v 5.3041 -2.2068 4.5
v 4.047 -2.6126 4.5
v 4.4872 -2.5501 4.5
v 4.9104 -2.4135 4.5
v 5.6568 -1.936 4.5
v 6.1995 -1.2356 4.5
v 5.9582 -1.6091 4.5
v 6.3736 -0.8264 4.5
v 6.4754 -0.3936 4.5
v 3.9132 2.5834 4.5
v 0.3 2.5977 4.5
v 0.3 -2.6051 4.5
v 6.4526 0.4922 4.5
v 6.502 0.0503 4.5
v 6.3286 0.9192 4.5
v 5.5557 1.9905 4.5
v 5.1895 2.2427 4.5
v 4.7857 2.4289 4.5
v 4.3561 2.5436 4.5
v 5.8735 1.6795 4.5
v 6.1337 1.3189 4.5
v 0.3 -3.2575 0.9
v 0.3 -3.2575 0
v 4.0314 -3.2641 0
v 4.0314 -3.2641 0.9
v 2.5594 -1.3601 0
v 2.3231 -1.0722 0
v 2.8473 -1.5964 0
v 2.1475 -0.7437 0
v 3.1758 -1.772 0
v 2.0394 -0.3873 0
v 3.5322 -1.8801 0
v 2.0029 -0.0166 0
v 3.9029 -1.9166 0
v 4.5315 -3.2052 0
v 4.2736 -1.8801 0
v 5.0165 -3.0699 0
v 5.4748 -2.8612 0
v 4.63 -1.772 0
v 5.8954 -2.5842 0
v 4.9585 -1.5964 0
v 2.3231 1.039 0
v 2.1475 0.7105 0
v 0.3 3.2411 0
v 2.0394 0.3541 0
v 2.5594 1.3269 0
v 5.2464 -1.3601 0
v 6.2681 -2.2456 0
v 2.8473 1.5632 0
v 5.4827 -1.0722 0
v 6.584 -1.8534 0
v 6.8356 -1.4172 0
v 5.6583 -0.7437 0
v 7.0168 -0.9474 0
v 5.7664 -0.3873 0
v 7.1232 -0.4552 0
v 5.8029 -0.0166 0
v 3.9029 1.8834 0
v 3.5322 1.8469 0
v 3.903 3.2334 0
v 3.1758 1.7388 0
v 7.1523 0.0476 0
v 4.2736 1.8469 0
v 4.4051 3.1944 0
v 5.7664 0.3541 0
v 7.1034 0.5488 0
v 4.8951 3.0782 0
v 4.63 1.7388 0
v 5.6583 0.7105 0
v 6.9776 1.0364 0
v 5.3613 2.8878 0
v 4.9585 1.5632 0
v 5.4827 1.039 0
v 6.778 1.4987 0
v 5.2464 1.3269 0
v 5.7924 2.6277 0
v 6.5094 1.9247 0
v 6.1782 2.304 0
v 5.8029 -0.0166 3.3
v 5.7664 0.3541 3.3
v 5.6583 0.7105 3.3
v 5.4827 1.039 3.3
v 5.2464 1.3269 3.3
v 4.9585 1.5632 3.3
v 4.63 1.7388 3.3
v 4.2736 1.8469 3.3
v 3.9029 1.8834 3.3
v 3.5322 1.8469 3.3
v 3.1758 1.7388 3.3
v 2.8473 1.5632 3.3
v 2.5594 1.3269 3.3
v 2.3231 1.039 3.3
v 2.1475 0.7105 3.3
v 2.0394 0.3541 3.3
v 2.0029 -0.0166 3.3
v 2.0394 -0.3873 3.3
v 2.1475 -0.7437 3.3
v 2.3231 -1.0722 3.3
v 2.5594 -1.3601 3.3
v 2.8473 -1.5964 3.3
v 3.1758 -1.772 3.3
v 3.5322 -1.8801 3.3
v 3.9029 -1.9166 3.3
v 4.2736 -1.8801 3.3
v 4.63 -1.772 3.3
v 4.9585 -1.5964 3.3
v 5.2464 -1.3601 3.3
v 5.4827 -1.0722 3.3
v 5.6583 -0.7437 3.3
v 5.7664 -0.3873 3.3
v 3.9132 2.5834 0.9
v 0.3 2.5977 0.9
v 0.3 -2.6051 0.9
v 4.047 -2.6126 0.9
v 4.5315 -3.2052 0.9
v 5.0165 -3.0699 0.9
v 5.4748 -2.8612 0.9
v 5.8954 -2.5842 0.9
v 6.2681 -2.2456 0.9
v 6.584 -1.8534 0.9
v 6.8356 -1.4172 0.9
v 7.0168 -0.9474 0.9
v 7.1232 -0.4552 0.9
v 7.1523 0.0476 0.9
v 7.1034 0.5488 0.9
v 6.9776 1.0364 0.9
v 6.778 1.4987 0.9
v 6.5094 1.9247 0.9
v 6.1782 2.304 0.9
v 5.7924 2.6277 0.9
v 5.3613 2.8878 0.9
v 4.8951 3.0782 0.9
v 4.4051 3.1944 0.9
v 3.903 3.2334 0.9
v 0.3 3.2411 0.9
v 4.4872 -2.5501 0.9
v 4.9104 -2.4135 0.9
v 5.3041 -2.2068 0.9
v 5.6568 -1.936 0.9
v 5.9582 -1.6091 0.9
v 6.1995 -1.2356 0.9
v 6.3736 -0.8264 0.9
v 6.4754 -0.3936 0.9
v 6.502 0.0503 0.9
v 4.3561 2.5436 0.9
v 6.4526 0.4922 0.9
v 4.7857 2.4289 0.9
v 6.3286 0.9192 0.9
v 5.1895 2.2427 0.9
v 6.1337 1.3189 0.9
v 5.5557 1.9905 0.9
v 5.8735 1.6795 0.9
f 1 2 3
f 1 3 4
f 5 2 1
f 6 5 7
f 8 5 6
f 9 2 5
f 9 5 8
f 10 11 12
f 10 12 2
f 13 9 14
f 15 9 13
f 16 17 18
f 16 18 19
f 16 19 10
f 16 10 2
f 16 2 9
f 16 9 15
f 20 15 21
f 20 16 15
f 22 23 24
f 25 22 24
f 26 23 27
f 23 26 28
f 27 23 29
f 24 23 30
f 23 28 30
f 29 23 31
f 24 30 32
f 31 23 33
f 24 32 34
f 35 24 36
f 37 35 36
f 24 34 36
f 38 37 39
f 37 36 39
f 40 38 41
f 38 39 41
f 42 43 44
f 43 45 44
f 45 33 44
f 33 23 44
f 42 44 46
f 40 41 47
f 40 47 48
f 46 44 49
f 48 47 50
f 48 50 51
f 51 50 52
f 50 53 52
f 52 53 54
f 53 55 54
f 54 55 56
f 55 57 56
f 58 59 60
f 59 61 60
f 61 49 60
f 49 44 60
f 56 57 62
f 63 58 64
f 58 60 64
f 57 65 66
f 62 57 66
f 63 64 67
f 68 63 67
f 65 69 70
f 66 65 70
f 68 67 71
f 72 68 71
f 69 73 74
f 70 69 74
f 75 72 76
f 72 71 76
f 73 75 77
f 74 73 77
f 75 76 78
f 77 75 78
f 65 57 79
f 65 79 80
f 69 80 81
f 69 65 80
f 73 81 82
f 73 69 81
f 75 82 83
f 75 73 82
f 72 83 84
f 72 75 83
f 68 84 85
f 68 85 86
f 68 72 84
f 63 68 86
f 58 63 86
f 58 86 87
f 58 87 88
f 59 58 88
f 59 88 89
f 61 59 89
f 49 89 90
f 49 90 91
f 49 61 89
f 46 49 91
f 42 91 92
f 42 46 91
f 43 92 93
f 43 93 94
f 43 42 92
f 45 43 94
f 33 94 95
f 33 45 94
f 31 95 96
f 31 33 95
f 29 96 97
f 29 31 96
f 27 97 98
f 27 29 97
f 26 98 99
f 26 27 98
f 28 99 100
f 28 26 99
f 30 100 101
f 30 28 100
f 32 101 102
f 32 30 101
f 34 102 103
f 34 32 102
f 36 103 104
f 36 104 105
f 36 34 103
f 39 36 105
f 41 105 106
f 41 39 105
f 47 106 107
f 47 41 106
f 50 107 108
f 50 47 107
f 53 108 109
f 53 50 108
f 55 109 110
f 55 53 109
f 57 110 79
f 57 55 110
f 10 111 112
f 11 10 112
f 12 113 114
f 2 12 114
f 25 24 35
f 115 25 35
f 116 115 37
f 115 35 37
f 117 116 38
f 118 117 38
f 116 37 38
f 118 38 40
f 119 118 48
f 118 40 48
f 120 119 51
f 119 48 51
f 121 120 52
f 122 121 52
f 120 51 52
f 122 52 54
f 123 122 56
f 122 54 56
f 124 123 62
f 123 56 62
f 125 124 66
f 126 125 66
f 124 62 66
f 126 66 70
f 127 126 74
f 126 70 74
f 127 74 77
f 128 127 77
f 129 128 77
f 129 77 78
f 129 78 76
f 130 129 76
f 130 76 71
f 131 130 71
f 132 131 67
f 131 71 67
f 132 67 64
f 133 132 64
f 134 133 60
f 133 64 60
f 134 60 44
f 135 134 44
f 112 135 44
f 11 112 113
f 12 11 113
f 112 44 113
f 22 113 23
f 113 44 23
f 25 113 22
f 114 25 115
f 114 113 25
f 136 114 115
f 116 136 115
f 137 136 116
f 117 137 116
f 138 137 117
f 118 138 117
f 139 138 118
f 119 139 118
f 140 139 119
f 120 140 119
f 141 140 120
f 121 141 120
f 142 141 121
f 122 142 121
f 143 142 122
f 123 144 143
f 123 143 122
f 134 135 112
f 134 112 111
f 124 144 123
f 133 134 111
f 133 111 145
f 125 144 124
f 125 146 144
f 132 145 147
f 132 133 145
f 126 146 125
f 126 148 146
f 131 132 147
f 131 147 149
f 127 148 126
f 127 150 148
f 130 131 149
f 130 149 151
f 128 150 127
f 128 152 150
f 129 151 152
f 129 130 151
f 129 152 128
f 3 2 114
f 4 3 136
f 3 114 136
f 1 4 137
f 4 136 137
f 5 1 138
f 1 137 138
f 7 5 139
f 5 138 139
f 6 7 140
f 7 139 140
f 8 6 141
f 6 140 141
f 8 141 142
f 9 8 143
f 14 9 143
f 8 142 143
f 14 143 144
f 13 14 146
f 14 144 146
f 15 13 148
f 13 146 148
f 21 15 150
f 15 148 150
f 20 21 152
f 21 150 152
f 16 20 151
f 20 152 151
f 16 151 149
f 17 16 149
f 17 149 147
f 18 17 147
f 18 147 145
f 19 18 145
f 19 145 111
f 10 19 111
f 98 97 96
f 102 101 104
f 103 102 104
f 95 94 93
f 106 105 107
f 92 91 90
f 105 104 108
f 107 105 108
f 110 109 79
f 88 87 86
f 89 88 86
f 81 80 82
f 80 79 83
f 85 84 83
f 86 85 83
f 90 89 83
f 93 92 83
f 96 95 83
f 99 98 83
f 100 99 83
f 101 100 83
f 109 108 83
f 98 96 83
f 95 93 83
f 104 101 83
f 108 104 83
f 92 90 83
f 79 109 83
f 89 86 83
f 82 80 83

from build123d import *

# Parameters (mm, degrees)
F0_R     = 1.9
F1_DEPTH = 0.9
F2_DEPTH = 4.5
F3_DEPTH = 3.3


with BuildPart() as f1:
    # F0 (on Top) → F1 (new body)
    with BuildSketch(Plane.XY):
        with BuildLine():
            Line((-0.3, 2.6000520814), (-3.8955825641, 2.5999907979))
            ThreePointArc((-3.8955825641, 2.5999907979), (-6.5018304859, -0.0590002136), (-3.7776200645, -2.5969992302))
            Line((-3.7776200645, -2.5969992302), (-0.3, -2.6039384091))
            Line((-0.3, -2.6039384091), (-0.3, 2.6000520814))
        make_face()
        with Locations((-3.9025, 0)):
            Circle(F0_R, mode=Mode.SUBTRACT)
        with BuildLine():
            ThreePointArc((-3.7776200645, -2.5969992302), (-6.5018304859, -0.0590002136), (-3.8955825641, 2.5999907979))
            Line((-3.8955825641, 2.5999907979), (-0.3, 2.6000520814))
            Line((-0.3, 2.6000520814), (-0.3, 3.2423396327))
            Line((-0.3, 3.2423396327), (-3.8955825641, 3.2499926383))
            ThreePointArc((-3.8955825641, 3.2499926383), (-7.1524938186, 0.0063386972), (-3.9082599583, -3.2499948958))
            Line((-3.9082599583, -3.2499948958), (-0.3, -3.2563898065))
            Line((-0.3, -3.2563898065), (-0.3, -2.6039384091))
            Line((-0.3, -2.6039384091), (-3.7776200645, -2.5969992302))
        make_face()
        with Locations((-3.9025, 0)):
            Circle(F0_R)
    extrude(amount=F1_DEPTH)

    # F0 (on Top) → F2 (join)
    with BuildSketch(Plane.XY):
        with BuildLine():
            Line((-0.3, 2.6000520814), (-3.8955825641, 2.5999907979))
            ThreePointArc((-3.8955825641, 2.5999907979), (-6.5018304859, -0.0590002136), (-3.7776200645, -2.5969992302))
            Line((-3.7776200645, -2.5969992302), (-0.3, -2.6039384091))
            Line((-0.3, -2.6039384091), (-0.3, 2.6000520814))
        make_face()
        with Locations((-3.9025, 0)):
            Circle(F0_R, mode=Mode.SUBTRACT)
        with Locations((-3.9025, 0)):
            Circle(F0_R)
    extrude(amount=F2_DEPTH)


with BuildPart() as f1b:
    # F0 (on Top) → F1, piece 2 (new body)
    with BuildSketch(Plane.XY):
        with BuildLine():
            Line((0.3, 2.5976768642), (0.3, -2.6051356381))
            Line((0.3, -2.6051356381), (4.0469650256, -2.612612263))
            ThreePointArc((4.0469650256, -2.612612263), (6.5020444574, 0.0503066263), (3.913198154, 2.5833733141))
            Line((3.913198154, 2.5833733141), (0.3, 2.5976768642))
        make_face()
        with Locations((3.9029056272, -0.0166063135)):
            Circle(F0_R, mode=Mode.SUBTRACT)
        with BuildLine():
            Line((0.3, -2.6051356381), (0.3, -3.257453185))
            Line((0.3, -3.257453185), (4.0313724183, -3.2640662876))
            ThreePointArc((4.0313724183, -3.2640662876), (7.1522718987, 0.0475718266), (3.9030412728, 3.2333936837))
            Line((3.9030412728, 3.2333936837), (0.3, 3.2410625647))
            Line((0.3, 3.2410625647), (0.3, 2.5976768642))
            Line((0.3, 2.5976768642), (3.913198154, 2.5833733141))
            ThreePointArc((3.913198154, 2.5833733141), (6.5020444574, 0.0503066263), (4.0469650256, -2.612612263))
            Line((4.0469650256, -2.612612263), (0.3, -2.6051356381))
        make_face()
        with Locations((3.9029056272, -0.0166063135)):
            Circle(F0_R)
    extrude(amount=F1_DEPTH)

    # F0 (on Top) → F2, piece 2 (join)
    with BuildSketch(Plane.XY):
        with BuildLine():
            Line((0.3, 2.5976768642), (0.3, -2.6051356381))
            Line((0.3, -2.6051356381), (4.0469650256, -2.612612263))
            ThreePointArc((4.0469650256, -2.612612263), (6.5020444574, 0.0503066263), (3.913198154, 2.5833733141))
            Line((3.913198154, 2.5833733141), (0.3, 2.5976768642))
        make_face()
        with Locations((3.9029056272, -0.0166063135)):
            Circle(F0_R, mode=Mode.SUBTRACT)
        with Locations((3.9029056272, -0.0166063135)):
            Circle(F0_R)
    extrude(amount=F2_DEPTH)


with BuildPart() as f3_tool:
    # F0 (on Top) → F3 (new body)
    with BuildSketch(Plane.XY):
        with Locations((-3.9025, 0)):
            Circle(F0_R)
        with Locations((3.9029056272, -0.0166063135)):
            Circle(F0_R)
    extrude(amount=F3_DEPTH)


with BuildPart() as f1_1:
    add(f1.part)

    # F3: cut by f3_tool
    add(f3_tool.part, mode=Mode.SUBTRACT)


with BuildPart() as f1b_1:
    add(f1b.part)

    # F3: cut by f3_tool
    add(f3_tool.part, mode=Mode.SUBTRACT)


solid = f1b_1.part
